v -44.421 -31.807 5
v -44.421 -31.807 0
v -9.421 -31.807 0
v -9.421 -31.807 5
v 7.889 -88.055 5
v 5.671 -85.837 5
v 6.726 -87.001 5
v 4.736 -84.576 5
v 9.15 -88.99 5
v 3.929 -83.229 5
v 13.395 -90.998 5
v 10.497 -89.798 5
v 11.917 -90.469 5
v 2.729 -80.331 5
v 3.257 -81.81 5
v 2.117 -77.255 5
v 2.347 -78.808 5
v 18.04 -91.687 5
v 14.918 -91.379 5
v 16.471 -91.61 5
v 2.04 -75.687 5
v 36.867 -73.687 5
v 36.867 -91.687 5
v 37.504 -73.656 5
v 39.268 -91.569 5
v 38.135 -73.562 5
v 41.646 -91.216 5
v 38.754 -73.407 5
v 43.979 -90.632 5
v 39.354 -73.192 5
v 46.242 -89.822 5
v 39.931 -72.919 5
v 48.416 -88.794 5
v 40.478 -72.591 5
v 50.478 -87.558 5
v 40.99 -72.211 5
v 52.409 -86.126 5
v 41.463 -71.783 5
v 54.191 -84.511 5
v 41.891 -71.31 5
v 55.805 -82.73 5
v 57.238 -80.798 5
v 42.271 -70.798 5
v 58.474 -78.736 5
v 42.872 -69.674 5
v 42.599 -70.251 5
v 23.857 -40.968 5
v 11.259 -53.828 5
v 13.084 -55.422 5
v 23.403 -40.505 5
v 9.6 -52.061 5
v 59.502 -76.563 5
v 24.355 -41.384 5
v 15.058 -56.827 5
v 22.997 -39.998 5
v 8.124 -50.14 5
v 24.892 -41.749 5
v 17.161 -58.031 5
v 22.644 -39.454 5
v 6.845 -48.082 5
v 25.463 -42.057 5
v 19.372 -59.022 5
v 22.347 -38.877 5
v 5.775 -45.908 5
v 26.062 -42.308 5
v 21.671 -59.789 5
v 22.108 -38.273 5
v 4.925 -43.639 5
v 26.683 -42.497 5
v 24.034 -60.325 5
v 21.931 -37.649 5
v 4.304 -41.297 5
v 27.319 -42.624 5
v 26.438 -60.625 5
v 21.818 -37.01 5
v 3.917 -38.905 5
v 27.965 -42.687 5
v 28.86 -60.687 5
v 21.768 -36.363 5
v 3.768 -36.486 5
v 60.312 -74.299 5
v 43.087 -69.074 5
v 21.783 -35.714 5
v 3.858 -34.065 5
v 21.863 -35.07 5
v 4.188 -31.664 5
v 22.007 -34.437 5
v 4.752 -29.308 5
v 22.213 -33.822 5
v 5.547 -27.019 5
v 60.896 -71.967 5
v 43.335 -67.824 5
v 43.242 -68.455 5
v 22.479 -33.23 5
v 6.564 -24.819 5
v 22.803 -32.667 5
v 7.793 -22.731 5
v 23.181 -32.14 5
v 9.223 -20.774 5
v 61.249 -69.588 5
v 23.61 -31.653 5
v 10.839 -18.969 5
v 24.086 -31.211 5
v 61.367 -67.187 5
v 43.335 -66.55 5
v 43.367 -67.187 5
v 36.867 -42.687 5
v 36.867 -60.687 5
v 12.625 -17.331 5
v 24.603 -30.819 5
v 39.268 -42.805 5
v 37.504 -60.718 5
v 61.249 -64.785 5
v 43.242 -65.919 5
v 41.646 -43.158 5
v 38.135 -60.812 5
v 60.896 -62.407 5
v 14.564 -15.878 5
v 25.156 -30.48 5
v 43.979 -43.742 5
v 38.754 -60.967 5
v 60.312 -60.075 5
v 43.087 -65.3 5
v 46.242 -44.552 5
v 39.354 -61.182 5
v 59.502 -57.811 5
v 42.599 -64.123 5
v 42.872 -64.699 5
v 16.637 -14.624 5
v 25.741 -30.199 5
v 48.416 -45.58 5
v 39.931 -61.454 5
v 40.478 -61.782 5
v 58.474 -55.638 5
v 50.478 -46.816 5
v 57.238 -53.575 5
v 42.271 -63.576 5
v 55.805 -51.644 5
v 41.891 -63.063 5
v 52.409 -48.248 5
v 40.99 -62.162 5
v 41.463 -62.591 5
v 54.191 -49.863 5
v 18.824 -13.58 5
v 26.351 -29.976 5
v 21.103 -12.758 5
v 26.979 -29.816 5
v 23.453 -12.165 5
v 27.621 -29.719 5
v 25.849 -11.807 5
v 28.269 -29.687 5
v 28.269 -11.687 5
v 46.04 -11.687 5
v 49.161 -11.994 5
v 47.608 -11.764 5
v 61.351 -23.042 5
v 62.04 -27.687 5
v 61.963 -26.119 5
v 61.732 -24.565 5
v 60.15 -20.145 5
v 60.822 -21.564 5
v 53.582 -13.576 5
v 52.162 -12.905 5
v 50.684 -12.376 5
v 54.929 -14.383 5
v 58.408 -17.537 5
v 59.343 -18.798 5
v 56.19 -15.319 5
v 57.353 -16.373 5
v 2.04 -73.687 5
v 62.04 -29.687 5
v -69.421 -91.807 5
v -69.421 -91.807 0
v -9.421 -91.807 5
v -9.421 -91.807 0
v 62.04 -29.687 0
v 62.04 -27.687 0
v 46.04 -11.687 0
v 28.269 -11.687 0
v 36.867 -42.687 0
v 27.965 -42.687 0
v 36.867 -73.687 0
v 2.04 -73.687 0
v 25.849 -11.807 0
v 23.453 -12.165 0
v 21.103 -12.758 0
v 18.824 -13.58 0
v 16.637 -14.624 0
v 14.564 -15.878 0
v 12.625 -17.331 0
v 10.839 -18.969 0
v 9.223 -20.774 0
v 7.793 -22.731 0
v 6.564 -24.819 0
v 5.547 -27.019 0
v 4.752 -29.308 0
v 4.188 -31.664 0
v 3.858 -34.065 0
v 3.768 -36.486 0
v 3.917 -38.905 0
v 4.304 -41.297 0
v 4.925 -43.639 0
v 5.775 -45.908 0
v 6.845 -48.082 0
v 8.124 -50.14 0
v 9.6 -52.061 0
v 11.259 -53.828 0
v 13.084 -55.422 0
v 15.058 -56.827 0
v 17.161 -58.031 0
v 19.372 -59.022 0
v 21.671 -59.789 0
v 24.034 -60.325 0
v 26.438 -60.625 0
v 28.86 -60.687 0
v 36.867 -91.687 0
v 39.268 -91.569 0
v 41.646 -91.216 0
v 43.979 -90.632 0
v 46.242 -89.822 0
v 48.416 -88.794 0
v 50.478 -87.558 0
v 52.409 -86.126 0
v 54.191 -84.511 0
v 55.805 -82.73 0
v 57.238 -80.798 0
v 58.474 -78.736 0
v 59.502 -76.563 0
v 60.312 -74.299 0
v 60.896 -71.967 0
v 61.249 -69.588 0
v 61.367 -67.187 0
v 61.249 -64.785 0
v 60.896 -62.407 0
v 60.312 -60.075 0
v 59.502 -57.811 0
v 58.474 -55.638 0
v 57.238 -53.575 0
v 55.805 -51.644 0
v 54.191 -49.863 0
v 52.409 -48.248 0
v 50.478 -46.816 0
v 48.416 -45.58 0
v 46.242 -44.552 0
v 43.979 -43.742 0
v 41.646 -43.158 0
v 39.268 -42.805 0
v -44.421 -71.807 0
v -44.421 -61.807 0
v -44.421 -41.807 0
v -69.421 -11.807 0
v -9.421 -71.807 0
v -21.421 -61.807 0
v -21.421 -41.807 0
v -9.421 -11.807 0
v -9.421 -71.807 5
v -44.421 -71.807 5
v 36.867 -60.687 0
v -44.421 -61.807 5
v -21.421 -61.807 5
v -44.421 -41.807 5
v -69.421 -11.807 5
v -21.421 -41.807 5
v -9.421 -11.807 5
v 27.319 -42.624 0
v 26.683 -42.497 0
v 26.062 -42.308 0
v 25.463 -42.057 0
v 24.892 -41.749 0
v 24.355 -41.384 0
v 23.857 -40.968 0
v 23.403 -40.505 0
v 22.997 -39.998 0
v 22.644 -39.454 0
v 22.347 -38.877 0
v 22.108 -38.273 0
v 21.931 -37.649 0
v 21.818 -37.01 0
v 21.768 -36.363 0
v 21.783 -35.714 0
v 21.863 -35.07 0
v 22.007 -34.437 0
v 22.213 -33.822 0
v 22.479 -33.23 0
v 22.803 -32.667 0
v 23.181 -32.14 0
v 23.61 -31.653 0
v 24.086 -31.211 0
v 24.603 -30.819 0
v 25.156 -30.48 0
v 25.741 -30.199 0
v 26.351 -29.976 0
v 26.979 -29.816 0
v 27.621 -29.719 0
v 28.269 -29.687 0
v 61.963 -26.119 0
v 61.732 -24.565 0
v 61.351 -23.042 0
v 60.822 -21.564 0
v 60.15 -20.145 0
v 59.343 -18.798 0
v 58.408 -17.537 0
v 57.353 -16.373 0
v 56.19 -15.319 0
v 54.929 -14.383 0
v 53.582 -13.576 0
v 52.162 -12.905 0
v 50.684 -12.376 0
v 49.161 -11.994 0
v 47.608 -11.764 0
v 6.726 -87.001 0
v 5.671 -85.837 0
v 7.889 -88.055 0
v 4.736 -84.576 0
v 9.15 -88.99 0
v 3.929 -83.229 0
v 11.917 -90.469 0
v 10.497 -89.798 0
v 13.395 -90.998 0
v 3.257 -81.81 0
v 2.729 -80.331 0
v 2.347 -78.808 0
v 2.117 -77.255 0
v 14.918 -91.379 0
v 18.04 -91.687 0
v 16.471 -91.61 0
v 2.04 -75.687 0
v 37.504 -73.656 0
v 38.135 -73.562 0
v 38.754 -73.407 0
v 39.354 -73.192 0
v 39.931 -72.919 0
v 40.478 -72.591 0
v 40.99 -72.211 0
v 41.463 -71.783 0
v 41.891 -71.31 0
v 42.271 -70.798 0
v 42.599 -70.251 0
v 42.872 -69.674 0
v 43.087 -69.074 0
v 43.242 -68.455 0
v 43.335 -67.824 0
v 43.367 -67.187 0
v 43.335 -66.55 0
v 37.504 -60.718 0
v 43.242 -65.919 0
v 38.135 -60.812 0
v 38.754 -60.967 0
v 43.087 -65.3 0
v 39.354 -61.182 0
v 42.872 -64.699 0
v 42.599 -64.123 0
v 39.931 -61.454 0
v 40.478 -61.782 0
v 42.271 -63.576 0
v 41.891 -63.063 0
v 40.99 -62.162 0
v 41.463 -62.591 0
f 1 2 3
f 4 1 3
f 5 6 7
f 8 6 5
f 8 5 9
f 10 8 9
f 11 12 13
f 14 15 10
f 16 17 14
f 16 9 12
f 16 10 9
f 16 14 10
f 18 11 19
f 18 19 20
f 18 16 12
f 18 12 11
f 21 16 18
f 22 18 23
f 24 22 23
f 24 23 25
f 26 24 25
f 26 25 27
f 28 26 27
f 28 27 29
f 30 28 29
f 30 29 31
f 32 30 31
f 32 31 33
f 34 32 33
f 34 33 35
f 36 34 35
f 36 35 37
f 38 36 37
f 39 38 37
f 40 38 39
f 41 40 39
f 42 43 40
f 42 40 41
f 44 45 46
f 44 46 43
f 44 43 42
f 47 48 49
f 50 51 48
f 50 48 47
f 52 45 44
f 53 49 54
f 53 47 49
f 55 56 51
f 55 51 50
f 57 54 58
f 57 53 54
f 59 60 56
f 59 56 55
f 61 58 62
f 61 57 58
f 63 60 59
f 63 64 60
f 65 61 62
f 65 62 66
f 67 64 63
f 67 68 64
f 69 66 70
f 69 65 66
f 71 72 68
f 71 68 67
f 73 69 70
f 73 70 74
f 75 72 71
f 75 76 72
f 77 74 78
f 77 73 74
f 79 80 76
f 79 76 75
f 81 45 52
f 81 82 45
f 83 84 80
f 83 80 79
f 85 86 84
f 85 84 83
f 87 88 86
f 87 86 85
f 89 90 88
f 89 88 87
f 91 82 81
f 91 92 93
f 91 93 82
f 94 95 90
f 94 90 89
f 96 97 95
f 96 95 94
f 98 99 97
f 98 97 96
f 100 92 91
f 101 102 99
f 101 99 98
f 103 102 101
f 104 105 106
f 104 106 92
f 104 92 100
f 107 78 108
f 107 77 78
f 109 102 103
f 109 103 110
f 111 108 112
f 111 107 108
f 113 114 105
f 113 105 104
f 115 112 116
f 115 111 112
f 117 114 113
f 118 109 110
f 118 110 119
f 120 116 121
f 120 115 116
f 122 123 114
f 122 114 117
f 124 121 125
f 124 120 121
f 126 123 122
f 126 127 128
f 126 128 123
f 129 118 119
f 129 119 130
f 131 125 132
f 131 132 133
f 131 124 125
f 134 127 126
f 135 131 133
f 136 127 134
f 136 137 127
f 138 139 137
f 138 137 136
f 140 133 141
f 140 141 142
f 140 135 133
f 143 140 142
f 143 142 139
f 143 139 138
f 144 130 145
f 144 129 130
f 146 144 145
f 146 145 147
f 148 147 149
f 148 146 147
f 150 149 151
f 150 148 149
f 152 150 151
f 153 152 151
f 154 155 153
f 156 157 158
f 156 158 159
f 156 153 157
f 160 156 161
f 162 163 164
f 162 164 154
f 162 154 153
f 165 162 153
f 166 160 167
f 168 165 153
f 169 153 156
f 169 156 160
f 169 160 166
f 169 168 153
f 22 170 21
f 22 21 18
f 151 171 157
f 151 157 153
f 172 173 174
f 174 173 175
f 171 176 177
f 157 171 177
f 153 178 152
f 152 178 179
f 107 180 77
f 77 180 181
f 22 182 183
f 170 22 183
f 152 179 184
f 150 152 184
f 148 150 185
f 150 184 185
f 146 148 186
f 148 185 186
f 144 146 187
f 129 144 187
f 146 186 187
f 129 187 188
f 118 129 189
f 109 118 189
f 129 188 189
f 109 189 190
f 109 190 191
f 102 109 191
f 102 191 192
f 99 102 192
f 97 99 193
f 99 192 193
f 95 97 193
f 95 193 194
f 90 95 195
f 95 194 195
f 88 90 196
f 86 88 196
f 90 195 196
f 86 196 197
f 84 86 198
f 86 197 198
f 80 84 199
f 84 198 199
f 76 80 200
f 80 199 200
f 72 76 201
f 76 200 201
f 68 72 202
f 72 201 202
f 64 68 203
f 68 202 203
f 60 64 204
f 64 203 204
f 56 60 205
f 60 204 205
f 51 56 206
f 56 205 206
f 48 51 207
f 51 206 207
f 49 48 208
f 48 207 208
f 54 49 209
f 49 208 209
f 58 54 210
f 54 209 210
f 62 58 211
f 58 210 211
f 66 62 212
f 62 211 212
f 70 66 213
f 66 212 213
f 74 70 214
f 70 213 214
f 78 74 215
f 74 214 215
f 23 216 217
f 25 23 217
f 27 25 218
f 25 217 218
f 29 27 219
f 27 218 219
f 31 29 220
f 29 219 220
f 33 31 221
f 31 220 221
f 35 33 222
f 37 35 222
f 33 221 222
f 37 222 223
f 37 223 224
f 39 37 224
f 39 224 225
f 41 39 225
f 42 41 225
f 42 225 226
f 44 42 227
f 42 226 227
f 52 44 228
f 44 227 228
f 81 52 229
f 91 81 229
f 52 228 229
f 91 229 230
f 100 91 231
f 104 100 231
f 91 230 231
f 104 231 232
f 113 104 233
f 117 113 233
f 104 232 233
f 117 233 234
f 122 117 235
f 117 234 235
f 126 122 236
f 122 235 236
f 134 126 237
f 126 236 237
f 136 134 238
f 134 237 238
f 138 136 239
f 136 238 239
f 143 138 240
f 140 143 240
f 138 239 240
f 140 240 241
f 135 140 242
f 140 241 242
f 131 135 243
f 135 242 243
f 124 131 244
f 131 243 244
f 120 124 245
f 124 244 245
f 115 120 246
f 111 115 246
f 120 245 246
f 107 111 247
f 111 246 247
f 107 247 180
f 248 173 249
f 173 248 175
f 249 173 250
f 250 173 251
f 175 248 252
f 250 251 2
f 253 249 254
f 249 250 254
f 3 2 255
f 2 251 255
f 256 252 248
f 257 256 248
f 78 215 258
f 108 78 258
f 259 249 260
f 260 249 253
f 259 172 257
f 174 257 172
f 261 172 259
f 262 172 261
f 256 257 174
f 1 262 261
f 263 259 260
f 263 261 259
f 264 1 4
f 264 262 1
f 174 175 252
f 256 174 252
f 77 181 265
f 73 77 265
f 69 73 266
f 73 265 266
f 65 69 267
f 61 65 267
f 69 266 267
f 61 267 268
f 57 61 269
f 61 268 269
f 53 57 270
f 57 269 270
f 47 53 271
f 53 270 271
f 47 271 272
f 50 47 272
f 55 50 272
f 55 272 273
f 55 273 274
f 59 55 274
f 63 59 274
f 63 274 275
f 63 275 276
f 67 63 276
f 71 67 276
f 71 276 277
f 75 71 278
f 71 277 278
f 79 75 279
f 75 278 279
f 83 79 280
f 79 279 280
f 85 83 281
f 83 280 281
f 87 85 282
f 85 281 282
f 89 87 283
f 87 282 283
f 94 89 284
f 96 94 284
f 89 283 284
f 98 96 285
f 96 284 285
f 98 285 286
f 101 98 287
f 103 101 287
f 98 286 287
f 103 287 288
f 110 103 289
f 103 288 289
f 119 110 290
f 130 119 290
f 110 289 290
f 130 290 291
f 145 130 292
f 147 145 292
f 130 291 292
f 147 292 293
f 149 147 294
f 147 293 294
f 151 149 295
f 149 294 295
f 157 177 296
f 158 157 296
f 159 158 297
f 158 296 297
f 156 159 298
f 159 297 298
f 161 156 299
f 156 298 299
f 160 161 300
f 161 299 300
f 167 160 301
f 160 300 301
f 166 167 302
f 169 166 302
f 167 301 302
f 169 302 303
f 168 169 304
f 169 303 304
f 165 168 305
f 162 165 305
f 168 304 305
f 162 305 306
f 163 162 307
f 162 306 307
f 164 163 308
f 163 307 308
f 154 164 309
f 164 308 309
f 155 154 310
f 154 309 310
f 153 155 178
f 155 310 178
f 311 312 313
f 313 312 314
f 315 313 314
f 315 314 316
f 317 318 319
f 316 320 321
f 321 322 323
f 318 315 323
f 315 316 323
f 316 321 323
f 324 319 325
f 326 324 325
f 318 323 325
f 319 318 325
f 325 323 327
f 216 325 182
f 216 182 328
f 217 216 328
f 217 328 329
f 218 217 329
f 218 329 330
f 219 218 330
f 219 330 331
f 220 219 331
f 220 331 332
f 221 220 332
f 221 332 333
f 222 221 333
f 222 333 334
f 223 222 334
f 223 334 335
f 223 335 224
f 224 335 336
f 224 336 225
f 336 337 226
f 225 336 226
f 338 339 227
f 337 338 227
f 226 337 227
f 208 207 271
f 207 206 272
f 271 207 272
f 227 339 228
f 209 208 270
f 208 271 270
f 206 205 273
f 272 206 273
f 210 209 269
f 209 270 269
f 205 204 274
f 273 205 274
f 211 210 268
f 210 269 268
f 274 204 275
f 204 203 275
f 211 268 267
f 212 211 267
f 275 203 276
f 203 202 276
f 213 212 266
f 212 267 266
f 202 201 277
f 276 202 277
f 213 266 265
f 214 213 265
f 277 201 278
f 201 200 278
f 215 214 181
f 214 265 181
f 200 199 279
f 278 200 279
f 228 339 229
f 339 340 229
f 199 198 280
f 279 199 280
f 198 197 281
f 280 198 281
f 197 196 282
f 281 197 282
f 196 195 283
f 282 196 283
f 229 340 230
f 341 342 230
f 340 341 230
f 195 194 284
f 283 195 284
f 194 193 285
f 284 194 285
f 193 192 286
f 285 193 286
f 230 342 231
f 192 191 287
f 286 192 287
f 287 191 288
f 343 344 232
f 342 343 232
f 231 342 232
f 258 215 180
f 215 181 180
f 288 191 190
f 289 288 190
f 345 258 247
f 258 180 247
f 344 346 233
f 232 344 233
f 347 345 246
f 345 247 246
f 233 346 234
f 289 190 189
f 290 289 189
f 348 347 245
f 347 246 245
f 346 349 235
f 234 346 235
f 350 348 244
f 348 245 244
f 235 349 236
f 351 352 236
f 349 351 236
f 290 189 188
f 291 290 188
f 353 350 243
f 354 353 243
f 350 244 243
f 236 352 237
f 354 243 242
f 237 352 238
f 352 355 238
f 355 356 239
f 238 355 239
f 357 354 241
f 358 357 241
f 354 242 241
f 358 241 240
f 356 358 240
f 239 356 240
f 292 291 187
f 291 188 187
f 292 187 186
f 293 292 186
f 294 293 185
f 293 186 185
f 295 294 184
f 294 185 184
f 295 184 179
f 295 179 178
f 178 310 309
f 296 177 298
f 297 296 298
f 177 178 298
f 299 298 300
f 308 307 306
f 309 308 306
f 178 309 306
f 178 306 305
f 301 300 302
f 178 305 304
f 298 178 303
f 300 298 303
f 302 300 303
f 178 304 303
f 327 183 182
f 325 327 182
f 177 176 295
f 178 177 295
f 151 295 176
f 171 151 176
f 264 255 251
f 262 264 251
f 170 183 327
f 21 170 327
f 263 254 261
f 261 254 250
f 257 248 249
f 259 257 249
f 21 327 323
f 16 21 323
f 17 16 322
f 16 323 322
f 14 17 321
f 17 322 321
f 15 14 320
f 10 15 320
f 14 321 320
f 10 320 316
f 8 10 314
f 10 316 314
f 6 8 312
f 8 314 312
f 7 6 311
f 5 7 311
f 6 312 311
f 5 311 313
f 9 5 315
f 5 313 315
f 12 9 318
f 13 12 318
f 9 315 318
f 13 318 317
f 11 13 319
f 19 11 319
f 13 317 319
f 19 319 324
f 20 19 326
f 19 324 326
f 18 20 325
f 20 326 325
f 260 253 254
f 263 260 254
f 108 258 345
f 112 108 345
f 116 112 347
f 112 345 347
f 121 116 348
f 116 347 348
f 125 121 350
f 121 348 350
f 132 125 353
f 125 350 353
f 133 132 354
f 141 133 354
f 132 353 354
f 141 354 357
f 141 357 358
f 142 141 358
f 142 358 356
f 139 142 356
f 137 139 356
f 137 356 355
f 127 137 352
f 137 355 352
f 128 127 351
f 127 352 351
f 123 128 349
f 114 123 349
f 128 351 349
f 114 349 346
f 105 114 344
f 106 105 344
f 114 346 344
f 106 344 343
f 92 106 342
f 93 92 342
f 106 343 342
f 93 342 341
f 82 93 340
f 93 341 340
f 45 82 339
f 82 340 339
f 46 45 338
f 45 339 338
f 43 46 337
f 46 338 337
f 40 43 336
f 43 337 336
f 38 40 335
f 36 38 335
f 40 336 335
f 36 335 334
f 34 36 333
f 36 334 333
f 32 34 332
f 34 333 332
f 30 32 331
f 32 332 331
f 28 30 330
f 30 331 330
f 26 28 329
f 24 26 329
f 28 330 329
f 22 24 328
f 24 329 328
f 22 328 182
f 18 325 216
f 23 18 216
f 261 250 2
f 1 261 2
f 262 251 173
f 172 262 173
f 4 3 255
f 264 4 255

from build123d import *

# Parameters (mm, degrees)
F1_DEPTH = 5


with BuildPart() as f1:
    # F0 (on Top) → F1 (new body)
    with BuildSketch(Plane.XY):
        Polygon((-9.42095, -11.807189), (-69.42095, -11.807189), (-69.42095, -91.807189), (-9.42095, -91.807189), (-9.42095, -71.807189), (-44.42095, -71.807189), (-44.42095, -61.807189), (-21.42095, -61.807189), (-21.42095, -41.807189), (-44.42095, -41.807189), (-44.42095, -31.807189), (-9.42095, -31.807189), align=None)
        with BuildLine():
            Line((46.039547, -11.686897), (28.269377, -11.686897))
            ThreePointArc((28.269377, -11.686897), (3.767594, -36.485995), (28.860401, -60.686897))
            Line((28.860401, -60.686897), (36.866678, -60.686897))
            ThreePointArc((36.866678, -60.686897), (43.366678, -67.186897), (36.866678, -73.686897))
            Line((36.866678, -73.686897), (2.039547, -73.686897))
            Line((2.039547, -73.686897), (2.039547, -75.686897))
            ThreePointArc((2.039547, -75.686897), (6.725839, -87.000605), (18.039547, -91.686897))
            Line((18.039547, -91.686897), (36.866678, -91.686897))
            ThreePointArc((36.866678, -91.686897), (61.366678, -67.186897), (36.866678, -42.686897))
            Line((36.866678, -42.686897), (28.573801, -42.686897))
            ThreePointArc((28.573801, -42.686897), (28.269377, -42.694026), (27.964952, -42.686897))
            ThreePointArc((27.964952, -42.686897), (21.767595, -36.038208), (28.269377, -29.686897))
            Line((28.269377, -29.686897), (62.039547, -29.686897))
            Line((62.039547, -29.686897), (62.039547, -27.686897))
            ThreePointArc((62.039547, -27.686897), (57.353256, -16.373188), (46.039547, -11.686897))
        make_face()
        with BuildLine():
            Line((28.573801, -42.686897), (27.964952, -42.686897))
            ThreePointArc((27.964952, -42.686897), (28.269377, -42.694026), (28.573801, -42.686897))
        make_face()
    extrude(amount=F1_DEPTH)


solid = f1.part
